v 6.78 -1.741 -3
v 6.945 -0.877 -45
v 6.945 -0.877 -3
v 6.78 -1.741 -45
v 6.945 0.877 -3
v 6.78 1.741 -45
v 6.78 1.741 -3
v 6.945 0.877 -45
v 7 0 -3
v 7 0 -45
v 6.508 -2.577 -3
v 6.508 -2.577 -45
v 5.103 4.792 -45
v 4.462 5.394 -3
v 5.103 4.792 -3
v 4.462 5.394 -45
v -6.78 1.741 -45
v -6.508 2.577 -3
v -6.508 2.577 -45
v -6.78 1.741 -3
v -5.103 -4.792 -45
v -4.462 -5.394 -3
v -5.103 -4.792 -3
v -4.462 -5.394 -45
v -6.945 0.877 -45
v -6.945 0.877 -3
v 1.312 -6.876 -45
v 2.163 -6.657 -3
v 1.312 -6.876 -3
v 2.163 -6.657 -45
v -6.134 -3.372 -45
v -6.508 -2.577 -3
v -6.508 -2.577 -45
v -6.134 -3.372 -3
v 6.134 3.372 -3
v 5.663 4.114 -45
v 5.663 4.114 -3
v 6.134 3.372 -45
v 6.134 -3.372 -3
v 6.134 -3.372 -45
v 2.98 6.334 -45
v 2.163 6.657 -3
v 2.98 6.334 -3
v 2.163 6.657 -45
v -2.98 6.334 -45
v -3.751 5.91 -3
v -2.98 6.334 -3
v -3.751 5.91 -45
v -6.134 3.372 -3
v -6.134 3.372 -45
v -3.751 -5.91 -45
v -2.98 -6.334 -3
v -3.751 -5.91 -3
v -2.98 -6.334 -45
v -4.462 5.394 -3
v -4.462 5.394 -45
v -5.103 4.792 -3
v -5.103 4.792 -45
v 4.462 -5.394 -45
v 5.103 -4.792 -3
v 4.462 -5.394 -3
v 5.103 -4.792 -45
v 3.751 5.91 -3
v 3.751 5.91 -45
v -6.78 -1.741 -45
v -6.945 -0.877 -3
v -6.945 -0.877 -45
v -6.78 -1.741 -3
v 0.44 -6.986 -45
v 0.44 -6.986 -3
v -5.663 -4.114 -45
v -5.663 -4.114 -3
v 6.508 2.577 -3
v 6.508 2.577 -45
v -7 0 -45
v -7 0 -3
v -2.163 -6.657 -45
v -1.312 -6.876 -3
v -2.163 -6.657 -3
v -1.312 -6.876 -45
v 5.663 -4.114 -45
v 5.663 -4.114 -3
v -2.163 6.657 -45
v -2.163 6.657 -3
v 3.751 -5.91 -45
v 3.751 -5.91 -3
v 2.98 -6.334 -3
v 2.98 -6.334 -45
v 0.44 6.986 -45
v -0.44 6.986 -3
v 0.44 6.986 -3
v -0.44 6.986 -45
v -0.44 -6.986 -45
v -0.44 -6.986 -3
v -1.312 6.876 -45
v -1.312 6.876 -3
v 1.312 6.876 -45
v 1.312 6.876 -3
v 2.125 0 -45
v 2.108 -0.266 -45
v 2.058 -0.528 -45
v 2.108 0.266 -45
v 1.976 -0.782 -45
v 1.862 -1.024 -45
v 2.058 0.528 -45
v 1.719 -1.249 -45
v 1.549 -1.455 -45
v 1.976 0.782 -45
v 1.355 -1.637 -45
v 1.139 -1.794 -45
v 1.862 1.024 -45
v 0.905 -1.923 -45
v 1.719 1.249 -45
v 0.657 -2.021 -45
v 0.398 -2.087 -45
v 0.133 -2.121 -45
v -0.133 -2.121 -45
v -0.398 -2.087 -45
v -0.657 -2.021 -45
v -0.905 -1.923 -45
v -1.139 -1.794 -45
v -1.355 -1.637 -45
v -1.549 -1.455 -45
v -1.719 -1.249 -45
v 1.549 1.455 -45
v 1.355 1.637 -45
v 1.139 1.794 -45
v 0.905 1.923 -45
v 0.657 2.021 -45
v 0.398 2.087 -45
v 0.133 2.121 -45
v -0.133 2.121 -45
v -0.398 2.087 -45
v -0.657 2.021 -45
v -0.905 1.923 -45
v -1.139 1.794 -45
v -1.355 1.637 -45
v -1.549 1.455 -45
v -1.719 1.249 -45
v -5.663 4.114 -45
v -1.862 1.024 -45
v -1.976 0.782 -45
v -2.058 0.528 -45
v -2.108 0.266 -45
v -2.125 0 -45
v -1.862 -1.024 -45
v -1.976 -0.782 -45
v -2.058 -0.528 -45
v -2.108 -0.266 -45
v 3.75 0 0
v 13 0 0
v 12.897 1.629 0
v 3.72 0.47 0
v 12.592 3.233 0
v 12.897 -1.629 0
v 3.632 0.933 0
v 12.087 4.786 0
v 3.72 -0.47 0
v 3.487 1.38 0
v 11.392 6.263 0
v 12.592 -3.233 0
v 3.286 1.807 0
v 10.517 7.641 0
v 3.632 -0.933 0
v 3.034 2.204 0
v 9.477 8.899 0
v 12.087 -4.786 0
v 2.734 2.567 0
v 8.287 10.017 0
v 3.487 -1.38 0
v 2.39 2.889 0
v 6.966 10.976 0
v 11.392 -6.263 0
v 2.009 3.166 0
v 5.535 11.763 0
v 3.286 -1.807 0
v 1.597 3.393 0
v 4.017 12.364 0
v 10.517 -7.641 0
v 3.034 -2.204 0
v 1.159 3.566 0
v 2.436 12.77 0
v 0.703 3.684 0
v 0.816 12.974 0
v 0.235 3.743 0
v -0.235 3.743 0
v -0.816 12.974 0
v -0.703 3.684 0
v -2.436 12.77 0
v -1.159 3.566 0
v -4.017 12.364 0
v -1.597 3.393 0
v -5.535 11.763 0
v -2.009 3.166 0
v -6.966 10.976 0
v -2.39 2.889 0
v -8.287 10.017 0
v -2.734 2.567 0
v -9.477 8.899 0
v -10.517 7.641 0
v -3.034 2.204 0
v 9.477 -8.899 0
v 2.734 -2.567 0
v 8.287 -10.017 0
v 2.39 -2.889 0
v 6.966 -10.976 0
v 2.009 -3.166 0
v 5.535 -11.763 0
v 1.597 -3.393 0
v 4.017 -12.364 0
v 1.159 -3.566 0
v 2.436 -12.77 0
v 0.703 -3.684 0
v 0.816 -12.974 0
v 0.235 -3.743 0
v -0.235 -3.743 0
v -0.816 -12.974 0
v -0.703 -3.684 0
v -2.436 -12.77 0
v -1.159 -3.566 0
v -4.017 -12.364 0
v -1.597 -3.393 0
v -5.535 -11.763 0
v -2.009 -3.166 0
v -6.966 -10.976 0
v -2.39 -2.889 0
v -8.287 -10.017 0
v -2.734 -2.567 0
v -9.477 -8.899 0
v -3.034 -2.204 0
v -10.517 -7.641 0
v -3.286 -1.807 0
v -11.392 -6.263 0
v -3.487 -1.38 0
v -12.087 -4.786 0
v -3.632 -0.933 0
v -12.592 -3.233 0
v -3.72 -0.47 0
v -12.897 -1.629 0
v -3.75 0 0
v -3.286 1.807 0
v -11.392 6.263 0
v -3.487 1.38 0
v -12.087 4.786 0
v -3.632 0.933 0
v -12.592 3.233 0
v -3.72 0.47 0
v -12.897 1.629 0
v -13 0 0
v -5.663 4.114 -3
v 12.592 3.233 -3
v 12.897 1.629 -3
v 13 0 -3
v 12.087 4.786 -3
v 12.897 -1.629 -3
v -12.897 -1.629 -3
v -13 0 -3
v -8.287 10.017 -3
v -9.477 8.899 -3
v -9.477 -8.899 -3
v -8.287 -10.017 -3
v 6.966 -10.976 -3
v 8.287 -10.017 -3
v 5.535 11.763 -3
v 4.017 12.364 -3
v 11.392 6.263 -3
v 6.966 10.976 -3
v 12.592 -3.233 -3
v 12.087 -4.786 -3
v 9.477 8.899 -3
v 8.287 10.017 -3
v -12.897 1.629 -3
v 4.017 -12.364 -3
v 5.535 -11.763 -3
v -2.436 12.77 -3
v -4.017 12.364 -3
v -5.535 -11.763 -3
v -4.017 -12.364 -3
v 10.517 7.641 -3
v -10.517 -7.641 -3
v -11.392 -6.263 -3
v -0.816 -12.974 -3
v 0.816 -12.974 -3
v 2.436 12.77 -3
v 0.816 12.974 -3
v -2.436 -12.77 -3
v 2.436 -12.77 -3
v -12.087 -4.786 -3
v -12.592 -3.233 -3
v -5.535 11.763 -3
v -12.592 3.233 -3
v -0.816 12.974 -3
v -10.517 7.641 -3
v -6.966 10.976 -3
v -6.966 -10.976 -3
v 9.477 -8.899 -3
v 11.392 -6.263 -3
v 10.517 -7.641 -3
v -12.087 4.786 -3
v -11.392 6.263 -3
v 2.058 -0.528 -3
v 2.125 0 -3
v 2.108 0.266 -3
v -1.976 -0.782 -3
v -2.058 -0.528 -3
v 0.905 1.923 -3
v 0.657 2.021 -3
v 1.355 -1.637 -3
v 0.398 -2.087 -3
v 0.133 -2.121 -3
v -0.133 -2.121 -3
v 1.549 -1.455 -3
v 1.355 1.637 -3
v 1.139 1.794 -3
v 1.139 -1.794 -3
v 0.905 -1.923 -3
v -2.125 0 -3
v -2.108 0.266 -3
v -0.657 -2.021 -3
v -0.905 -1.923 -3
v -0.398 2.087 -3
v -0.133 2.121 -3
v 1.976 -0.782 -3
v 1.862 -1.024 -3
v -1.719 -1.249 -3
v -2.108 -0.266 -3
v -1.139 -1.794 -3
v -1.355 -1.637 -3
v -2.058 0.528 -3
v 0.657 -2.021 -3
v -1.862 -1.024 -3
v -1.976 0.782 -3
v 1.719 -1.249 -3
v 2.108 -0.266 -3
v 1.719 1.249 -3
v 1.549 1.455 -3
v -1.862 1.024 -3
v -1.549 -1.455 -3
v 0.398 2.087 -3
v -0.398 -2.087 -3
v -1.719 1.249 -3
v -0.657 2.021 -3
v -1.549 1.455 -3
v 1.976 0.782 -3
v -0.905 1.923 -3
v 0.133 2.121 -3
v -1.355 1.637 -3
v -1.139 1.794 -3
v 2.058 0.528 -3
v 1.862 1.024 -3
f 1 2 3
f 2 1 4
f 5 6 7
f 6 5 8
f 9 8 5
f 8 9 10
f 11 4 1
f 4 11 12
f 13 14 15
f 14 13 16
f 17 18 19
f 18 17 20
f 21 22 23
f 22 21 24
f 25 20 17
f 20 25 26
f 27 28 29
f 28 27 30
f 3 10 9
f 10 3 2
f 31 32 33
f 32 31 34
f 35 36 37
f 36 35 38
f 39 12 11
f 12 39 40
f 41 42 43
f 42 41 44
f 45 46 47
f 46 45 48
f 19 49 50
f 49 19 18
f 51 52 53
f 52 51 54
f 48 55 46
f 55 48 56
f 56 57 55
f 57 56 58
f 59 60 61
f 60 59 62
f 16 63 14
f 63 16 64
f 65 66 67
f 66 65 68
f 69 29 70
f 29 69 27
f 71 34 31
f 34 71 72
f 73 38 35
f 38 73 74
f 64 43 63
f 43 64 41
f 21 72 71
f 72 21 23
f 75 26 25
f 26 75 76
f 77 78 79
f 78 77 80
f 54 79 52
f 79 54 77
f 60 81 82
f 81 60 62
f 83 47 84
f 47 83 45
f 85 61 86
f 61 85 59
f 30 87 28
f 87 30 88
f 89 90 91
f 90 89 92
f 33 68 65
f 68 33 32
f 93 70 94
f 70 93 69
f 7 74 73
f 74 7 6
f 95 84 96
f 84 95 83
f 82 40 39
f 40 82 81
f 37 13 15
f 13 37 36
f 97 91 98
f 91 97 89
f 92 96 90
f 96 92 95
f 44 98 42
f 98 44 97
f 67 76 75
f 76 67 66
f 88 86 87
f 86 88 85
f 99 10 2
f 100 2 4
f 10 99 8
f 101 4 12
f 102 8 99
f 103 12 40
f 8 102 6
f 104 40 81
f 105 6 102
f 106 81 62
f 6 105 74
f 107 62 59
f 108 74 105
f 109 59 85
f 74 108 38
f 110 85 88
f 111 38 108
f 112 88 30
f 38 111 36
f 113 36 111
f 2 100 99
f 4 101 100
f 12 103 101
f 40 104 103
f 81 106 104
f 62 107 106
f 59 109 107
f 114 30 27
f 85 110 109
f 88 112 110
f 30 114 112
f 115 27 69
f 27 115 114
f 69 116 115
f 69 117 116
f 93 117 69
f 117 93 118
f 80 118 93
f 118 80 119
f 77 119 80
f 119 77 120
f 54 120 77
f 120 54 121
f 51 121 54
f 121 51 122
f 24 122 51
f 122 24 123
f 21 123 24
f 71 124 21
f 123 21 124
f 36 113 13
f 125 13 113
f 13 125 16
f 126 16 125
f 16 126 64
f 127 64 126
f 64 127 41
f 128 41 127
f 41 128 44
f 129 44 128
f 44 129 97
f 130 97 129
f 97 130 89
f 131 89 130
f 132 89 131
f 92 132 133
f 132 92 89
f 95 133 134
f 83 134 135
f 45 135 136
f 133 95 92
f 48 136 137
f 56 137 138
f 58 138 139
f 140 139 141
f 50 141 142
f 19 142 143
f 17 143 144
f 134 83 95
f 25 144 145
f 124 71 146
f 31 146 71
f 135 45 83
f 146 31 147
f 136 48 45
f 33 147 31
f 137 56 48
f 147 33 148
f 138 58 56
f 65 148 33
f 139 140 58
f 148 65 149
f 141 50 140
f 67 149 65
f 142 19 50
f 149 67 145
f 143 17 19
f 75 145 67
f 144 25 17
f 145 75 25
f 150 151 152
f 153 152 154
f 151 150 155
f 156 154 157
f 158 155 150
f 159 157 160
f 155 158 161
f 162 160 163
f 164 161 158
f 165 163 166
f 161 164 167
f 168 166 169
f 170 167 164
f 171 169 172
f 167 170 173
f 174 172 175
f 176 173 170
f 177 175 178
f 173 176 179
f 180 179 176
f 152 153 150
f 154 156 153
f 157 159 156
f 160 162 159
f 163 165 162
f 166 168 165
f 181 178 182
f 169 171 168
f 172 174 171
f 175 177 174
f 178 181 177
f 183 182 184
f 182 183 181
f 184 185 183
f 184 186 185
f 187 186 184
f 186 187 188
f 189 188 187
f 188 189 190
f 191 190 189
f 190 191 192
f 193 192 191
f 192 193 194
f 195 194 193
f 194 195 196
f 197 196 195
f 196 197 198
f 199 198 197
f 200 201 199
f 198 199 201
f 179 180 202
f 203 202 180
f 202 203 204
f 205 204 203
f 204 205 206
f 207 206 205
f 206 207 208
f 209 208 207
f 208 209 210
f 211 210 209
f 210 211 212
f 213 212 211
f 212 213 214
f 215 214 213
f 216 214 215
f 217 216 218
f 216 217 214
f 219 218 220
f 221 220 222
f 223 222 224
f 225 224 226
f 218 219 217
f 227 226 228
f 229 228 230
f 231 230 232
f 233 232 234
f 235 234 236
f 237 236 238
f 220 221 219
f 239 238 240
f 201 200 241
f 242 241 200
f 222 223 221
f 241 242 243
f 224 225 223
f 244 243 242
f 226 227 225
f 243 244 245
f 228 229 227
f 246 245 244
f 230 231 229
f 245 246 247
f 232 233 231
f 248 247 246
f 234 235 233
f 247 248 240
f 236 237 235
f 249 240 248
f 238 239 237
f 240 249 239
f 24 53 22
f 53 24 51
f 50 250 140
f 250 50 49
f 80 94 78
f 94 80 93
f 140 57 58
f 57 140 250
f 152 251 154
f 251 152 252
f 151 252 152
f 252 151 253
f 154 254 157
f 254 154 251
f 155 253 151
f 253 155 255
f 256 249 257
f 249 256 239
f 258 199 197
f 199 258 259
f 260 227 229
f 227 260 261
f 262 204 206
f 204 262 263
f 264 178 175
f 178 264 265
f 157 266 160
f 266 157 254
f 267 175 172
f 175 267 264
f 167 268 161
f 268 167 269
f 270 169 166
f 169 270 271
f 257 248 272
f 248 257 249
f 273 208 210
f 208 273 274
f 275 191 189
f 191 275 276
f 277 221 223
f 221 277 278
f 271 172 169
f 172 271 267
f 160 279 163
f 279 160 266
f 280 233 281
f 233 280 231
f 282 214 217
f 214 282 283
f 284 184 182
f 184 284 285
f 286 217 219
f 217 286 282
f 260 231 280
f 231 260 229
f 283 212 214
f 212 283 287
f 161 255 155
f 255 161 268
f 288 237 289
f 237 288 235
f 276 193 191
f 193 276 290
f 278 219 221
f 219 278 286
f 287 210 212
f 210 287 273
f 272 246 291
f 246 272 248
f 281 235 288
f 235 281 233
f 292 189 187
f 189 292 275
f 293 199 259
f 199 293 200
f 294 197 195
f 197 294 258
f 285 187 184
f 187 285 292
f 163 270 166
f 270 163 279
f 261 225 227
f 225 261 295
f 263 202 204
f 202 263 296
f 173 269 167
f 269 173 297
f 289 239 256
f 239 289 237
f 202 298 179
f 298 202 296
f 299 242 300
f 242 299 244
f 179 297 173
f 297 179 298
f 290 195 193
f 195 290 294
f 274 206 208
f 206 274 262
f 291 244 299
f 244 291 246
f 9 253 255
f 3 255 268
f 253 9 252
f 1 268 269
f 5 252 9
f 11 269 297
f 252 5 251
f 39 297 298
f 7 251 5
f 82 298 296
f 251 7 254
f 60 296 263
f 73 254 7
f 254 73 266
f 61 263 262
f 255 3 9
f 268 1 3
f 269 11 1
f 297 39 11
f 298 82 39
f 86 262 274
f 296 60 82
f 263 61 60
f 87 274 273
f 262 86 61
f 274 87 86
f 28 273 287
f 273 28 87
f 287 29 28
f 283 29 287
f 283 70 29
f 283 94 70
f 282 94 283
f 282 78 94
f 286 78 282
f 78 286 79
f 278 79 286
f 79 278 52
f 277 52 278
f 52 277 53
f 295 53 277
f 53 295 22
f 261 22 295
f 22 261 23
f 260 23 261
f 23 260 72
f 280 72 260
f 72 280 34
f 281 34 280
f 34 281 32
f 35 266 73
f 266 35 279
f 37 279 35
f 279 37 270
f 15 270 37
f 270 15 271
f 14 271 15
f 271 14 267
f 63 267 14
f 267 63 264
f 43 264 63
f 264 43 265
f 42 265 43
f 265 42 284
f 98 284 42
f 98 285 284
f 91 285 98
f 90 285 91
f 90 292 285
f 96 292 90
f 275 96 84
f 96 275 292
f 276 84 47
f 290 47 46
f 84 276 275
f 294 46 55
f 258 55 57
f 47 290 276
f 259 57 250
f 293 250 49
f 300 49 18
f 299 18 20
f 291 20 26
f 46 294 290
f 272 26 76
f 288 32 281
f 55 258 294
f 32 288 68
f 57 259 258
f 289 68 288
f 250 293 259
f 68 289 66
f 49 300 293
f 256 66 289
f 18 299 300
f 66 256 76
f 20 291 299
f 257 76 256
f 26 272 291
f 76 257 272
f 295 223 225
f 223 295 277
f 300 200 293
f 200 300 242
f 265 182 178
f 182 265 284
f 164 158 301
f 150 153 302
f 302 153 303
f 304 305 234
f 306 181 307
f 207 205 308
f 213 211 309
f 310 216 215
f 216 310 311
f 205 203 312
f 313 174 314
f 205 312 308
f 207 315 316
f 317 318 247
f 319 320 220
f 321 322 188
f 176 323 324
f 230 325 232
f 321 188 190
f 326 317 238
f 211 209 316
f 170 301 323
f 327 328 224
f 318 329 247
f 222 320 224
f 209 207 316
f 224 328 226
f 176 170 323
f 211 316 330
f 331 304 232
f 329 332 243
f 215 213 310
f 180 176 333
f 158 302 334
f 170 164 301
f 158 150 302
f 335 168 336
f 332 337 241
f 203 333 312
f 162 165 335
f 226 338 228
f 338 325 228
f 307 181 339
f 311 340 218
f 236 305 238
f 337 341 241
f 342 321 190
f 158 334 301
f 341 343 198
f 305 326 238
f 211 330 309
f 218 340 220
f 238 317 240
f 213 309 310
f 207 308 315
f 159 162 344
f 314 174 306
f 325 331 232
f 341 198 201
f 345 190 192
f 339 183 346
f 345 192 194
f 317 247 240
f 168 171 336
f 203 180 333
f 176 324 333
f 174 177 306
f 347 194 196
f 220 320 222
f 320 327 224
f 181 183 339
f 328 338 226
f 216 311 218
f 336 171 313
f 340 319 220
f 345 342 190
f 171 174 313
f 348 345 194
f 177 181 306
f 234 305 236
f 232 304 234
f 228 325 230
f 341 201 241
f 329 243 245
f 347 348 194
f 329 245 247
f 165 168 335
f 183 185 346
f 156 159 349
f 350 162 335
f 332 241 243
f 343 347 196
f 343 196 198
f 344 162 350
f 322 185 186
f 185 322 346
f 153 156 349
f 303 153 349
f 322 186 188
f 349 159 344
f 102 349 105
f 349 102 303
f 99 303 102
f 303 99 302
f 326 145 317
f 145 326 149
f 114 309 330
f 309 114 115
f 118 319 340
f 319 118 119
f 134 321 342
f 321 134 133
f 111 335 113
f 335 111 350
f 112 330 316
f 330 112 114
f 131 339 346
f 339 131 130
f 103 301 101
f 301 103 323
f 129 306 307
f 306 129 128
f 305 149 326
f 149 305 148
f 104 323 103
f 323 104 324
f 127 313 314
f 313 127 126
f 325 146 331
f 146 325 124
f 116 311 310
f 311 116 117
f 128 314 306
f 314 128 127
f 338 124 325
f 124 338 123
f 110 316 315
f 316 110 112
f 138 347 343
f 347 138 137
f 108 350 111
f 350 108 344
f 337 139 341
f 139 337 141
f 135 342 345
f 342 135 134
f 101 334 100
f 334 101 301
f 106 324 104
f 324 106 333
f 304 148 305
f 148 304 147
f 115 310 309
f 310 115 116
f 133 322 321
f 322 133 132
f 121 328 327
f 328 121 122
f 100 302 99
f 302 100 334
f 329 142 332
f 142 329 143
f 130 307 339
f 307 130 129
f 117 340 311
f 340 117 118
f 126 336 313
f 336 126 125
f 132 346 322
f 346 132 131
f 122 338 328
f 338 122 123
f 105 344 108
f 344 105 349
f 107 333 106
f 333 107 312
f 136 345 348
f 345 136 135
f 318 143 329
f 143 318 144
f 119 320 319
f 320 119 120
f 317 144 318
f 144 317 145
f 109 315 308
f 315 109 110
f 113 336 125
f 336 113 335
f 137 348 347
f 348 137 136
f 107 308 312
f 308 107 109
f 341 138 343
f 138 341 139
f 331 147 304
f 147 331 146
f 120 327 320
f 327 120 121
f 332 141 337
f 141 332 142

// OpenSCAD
$fn = 50;


difference() {
	union() {
		translate(v = [0, 0, -45.0000000000]) {
			cylinder(h = 45, r = 7.0000000000);
		}
		translate(v = [0, 0, -3.0000000000]) {
			cylinder(h = 3, r = 13.0000000000);
		}
	}
	union() {
		translate(v = [0, 0, 0]) {
			rotate(a = [0, 0, 0]) {
				difference() {
					union() {
						#translate(v = [0, 0, -45.0000000000]) {
							cylinder(h = 45, r = 2.0000000000);
						}
						#translate(v = [0, 0, -3]) {
							cylinder(h = 3, r = 7.0000000000, r1 = 2.1250000000, r2 = 3.7500000000);
						}
						#translate(v = [0, 0, -45.0000000000]) {
							cylinder(h = 45, r = 2.1250000000);
						}
						#translate(v = [0, 0, -45.0000000000]) {
							cylinder(h = 45, r = 2.0000000000);
						}
					}
					union();
				}
			}
		}
	}
}
